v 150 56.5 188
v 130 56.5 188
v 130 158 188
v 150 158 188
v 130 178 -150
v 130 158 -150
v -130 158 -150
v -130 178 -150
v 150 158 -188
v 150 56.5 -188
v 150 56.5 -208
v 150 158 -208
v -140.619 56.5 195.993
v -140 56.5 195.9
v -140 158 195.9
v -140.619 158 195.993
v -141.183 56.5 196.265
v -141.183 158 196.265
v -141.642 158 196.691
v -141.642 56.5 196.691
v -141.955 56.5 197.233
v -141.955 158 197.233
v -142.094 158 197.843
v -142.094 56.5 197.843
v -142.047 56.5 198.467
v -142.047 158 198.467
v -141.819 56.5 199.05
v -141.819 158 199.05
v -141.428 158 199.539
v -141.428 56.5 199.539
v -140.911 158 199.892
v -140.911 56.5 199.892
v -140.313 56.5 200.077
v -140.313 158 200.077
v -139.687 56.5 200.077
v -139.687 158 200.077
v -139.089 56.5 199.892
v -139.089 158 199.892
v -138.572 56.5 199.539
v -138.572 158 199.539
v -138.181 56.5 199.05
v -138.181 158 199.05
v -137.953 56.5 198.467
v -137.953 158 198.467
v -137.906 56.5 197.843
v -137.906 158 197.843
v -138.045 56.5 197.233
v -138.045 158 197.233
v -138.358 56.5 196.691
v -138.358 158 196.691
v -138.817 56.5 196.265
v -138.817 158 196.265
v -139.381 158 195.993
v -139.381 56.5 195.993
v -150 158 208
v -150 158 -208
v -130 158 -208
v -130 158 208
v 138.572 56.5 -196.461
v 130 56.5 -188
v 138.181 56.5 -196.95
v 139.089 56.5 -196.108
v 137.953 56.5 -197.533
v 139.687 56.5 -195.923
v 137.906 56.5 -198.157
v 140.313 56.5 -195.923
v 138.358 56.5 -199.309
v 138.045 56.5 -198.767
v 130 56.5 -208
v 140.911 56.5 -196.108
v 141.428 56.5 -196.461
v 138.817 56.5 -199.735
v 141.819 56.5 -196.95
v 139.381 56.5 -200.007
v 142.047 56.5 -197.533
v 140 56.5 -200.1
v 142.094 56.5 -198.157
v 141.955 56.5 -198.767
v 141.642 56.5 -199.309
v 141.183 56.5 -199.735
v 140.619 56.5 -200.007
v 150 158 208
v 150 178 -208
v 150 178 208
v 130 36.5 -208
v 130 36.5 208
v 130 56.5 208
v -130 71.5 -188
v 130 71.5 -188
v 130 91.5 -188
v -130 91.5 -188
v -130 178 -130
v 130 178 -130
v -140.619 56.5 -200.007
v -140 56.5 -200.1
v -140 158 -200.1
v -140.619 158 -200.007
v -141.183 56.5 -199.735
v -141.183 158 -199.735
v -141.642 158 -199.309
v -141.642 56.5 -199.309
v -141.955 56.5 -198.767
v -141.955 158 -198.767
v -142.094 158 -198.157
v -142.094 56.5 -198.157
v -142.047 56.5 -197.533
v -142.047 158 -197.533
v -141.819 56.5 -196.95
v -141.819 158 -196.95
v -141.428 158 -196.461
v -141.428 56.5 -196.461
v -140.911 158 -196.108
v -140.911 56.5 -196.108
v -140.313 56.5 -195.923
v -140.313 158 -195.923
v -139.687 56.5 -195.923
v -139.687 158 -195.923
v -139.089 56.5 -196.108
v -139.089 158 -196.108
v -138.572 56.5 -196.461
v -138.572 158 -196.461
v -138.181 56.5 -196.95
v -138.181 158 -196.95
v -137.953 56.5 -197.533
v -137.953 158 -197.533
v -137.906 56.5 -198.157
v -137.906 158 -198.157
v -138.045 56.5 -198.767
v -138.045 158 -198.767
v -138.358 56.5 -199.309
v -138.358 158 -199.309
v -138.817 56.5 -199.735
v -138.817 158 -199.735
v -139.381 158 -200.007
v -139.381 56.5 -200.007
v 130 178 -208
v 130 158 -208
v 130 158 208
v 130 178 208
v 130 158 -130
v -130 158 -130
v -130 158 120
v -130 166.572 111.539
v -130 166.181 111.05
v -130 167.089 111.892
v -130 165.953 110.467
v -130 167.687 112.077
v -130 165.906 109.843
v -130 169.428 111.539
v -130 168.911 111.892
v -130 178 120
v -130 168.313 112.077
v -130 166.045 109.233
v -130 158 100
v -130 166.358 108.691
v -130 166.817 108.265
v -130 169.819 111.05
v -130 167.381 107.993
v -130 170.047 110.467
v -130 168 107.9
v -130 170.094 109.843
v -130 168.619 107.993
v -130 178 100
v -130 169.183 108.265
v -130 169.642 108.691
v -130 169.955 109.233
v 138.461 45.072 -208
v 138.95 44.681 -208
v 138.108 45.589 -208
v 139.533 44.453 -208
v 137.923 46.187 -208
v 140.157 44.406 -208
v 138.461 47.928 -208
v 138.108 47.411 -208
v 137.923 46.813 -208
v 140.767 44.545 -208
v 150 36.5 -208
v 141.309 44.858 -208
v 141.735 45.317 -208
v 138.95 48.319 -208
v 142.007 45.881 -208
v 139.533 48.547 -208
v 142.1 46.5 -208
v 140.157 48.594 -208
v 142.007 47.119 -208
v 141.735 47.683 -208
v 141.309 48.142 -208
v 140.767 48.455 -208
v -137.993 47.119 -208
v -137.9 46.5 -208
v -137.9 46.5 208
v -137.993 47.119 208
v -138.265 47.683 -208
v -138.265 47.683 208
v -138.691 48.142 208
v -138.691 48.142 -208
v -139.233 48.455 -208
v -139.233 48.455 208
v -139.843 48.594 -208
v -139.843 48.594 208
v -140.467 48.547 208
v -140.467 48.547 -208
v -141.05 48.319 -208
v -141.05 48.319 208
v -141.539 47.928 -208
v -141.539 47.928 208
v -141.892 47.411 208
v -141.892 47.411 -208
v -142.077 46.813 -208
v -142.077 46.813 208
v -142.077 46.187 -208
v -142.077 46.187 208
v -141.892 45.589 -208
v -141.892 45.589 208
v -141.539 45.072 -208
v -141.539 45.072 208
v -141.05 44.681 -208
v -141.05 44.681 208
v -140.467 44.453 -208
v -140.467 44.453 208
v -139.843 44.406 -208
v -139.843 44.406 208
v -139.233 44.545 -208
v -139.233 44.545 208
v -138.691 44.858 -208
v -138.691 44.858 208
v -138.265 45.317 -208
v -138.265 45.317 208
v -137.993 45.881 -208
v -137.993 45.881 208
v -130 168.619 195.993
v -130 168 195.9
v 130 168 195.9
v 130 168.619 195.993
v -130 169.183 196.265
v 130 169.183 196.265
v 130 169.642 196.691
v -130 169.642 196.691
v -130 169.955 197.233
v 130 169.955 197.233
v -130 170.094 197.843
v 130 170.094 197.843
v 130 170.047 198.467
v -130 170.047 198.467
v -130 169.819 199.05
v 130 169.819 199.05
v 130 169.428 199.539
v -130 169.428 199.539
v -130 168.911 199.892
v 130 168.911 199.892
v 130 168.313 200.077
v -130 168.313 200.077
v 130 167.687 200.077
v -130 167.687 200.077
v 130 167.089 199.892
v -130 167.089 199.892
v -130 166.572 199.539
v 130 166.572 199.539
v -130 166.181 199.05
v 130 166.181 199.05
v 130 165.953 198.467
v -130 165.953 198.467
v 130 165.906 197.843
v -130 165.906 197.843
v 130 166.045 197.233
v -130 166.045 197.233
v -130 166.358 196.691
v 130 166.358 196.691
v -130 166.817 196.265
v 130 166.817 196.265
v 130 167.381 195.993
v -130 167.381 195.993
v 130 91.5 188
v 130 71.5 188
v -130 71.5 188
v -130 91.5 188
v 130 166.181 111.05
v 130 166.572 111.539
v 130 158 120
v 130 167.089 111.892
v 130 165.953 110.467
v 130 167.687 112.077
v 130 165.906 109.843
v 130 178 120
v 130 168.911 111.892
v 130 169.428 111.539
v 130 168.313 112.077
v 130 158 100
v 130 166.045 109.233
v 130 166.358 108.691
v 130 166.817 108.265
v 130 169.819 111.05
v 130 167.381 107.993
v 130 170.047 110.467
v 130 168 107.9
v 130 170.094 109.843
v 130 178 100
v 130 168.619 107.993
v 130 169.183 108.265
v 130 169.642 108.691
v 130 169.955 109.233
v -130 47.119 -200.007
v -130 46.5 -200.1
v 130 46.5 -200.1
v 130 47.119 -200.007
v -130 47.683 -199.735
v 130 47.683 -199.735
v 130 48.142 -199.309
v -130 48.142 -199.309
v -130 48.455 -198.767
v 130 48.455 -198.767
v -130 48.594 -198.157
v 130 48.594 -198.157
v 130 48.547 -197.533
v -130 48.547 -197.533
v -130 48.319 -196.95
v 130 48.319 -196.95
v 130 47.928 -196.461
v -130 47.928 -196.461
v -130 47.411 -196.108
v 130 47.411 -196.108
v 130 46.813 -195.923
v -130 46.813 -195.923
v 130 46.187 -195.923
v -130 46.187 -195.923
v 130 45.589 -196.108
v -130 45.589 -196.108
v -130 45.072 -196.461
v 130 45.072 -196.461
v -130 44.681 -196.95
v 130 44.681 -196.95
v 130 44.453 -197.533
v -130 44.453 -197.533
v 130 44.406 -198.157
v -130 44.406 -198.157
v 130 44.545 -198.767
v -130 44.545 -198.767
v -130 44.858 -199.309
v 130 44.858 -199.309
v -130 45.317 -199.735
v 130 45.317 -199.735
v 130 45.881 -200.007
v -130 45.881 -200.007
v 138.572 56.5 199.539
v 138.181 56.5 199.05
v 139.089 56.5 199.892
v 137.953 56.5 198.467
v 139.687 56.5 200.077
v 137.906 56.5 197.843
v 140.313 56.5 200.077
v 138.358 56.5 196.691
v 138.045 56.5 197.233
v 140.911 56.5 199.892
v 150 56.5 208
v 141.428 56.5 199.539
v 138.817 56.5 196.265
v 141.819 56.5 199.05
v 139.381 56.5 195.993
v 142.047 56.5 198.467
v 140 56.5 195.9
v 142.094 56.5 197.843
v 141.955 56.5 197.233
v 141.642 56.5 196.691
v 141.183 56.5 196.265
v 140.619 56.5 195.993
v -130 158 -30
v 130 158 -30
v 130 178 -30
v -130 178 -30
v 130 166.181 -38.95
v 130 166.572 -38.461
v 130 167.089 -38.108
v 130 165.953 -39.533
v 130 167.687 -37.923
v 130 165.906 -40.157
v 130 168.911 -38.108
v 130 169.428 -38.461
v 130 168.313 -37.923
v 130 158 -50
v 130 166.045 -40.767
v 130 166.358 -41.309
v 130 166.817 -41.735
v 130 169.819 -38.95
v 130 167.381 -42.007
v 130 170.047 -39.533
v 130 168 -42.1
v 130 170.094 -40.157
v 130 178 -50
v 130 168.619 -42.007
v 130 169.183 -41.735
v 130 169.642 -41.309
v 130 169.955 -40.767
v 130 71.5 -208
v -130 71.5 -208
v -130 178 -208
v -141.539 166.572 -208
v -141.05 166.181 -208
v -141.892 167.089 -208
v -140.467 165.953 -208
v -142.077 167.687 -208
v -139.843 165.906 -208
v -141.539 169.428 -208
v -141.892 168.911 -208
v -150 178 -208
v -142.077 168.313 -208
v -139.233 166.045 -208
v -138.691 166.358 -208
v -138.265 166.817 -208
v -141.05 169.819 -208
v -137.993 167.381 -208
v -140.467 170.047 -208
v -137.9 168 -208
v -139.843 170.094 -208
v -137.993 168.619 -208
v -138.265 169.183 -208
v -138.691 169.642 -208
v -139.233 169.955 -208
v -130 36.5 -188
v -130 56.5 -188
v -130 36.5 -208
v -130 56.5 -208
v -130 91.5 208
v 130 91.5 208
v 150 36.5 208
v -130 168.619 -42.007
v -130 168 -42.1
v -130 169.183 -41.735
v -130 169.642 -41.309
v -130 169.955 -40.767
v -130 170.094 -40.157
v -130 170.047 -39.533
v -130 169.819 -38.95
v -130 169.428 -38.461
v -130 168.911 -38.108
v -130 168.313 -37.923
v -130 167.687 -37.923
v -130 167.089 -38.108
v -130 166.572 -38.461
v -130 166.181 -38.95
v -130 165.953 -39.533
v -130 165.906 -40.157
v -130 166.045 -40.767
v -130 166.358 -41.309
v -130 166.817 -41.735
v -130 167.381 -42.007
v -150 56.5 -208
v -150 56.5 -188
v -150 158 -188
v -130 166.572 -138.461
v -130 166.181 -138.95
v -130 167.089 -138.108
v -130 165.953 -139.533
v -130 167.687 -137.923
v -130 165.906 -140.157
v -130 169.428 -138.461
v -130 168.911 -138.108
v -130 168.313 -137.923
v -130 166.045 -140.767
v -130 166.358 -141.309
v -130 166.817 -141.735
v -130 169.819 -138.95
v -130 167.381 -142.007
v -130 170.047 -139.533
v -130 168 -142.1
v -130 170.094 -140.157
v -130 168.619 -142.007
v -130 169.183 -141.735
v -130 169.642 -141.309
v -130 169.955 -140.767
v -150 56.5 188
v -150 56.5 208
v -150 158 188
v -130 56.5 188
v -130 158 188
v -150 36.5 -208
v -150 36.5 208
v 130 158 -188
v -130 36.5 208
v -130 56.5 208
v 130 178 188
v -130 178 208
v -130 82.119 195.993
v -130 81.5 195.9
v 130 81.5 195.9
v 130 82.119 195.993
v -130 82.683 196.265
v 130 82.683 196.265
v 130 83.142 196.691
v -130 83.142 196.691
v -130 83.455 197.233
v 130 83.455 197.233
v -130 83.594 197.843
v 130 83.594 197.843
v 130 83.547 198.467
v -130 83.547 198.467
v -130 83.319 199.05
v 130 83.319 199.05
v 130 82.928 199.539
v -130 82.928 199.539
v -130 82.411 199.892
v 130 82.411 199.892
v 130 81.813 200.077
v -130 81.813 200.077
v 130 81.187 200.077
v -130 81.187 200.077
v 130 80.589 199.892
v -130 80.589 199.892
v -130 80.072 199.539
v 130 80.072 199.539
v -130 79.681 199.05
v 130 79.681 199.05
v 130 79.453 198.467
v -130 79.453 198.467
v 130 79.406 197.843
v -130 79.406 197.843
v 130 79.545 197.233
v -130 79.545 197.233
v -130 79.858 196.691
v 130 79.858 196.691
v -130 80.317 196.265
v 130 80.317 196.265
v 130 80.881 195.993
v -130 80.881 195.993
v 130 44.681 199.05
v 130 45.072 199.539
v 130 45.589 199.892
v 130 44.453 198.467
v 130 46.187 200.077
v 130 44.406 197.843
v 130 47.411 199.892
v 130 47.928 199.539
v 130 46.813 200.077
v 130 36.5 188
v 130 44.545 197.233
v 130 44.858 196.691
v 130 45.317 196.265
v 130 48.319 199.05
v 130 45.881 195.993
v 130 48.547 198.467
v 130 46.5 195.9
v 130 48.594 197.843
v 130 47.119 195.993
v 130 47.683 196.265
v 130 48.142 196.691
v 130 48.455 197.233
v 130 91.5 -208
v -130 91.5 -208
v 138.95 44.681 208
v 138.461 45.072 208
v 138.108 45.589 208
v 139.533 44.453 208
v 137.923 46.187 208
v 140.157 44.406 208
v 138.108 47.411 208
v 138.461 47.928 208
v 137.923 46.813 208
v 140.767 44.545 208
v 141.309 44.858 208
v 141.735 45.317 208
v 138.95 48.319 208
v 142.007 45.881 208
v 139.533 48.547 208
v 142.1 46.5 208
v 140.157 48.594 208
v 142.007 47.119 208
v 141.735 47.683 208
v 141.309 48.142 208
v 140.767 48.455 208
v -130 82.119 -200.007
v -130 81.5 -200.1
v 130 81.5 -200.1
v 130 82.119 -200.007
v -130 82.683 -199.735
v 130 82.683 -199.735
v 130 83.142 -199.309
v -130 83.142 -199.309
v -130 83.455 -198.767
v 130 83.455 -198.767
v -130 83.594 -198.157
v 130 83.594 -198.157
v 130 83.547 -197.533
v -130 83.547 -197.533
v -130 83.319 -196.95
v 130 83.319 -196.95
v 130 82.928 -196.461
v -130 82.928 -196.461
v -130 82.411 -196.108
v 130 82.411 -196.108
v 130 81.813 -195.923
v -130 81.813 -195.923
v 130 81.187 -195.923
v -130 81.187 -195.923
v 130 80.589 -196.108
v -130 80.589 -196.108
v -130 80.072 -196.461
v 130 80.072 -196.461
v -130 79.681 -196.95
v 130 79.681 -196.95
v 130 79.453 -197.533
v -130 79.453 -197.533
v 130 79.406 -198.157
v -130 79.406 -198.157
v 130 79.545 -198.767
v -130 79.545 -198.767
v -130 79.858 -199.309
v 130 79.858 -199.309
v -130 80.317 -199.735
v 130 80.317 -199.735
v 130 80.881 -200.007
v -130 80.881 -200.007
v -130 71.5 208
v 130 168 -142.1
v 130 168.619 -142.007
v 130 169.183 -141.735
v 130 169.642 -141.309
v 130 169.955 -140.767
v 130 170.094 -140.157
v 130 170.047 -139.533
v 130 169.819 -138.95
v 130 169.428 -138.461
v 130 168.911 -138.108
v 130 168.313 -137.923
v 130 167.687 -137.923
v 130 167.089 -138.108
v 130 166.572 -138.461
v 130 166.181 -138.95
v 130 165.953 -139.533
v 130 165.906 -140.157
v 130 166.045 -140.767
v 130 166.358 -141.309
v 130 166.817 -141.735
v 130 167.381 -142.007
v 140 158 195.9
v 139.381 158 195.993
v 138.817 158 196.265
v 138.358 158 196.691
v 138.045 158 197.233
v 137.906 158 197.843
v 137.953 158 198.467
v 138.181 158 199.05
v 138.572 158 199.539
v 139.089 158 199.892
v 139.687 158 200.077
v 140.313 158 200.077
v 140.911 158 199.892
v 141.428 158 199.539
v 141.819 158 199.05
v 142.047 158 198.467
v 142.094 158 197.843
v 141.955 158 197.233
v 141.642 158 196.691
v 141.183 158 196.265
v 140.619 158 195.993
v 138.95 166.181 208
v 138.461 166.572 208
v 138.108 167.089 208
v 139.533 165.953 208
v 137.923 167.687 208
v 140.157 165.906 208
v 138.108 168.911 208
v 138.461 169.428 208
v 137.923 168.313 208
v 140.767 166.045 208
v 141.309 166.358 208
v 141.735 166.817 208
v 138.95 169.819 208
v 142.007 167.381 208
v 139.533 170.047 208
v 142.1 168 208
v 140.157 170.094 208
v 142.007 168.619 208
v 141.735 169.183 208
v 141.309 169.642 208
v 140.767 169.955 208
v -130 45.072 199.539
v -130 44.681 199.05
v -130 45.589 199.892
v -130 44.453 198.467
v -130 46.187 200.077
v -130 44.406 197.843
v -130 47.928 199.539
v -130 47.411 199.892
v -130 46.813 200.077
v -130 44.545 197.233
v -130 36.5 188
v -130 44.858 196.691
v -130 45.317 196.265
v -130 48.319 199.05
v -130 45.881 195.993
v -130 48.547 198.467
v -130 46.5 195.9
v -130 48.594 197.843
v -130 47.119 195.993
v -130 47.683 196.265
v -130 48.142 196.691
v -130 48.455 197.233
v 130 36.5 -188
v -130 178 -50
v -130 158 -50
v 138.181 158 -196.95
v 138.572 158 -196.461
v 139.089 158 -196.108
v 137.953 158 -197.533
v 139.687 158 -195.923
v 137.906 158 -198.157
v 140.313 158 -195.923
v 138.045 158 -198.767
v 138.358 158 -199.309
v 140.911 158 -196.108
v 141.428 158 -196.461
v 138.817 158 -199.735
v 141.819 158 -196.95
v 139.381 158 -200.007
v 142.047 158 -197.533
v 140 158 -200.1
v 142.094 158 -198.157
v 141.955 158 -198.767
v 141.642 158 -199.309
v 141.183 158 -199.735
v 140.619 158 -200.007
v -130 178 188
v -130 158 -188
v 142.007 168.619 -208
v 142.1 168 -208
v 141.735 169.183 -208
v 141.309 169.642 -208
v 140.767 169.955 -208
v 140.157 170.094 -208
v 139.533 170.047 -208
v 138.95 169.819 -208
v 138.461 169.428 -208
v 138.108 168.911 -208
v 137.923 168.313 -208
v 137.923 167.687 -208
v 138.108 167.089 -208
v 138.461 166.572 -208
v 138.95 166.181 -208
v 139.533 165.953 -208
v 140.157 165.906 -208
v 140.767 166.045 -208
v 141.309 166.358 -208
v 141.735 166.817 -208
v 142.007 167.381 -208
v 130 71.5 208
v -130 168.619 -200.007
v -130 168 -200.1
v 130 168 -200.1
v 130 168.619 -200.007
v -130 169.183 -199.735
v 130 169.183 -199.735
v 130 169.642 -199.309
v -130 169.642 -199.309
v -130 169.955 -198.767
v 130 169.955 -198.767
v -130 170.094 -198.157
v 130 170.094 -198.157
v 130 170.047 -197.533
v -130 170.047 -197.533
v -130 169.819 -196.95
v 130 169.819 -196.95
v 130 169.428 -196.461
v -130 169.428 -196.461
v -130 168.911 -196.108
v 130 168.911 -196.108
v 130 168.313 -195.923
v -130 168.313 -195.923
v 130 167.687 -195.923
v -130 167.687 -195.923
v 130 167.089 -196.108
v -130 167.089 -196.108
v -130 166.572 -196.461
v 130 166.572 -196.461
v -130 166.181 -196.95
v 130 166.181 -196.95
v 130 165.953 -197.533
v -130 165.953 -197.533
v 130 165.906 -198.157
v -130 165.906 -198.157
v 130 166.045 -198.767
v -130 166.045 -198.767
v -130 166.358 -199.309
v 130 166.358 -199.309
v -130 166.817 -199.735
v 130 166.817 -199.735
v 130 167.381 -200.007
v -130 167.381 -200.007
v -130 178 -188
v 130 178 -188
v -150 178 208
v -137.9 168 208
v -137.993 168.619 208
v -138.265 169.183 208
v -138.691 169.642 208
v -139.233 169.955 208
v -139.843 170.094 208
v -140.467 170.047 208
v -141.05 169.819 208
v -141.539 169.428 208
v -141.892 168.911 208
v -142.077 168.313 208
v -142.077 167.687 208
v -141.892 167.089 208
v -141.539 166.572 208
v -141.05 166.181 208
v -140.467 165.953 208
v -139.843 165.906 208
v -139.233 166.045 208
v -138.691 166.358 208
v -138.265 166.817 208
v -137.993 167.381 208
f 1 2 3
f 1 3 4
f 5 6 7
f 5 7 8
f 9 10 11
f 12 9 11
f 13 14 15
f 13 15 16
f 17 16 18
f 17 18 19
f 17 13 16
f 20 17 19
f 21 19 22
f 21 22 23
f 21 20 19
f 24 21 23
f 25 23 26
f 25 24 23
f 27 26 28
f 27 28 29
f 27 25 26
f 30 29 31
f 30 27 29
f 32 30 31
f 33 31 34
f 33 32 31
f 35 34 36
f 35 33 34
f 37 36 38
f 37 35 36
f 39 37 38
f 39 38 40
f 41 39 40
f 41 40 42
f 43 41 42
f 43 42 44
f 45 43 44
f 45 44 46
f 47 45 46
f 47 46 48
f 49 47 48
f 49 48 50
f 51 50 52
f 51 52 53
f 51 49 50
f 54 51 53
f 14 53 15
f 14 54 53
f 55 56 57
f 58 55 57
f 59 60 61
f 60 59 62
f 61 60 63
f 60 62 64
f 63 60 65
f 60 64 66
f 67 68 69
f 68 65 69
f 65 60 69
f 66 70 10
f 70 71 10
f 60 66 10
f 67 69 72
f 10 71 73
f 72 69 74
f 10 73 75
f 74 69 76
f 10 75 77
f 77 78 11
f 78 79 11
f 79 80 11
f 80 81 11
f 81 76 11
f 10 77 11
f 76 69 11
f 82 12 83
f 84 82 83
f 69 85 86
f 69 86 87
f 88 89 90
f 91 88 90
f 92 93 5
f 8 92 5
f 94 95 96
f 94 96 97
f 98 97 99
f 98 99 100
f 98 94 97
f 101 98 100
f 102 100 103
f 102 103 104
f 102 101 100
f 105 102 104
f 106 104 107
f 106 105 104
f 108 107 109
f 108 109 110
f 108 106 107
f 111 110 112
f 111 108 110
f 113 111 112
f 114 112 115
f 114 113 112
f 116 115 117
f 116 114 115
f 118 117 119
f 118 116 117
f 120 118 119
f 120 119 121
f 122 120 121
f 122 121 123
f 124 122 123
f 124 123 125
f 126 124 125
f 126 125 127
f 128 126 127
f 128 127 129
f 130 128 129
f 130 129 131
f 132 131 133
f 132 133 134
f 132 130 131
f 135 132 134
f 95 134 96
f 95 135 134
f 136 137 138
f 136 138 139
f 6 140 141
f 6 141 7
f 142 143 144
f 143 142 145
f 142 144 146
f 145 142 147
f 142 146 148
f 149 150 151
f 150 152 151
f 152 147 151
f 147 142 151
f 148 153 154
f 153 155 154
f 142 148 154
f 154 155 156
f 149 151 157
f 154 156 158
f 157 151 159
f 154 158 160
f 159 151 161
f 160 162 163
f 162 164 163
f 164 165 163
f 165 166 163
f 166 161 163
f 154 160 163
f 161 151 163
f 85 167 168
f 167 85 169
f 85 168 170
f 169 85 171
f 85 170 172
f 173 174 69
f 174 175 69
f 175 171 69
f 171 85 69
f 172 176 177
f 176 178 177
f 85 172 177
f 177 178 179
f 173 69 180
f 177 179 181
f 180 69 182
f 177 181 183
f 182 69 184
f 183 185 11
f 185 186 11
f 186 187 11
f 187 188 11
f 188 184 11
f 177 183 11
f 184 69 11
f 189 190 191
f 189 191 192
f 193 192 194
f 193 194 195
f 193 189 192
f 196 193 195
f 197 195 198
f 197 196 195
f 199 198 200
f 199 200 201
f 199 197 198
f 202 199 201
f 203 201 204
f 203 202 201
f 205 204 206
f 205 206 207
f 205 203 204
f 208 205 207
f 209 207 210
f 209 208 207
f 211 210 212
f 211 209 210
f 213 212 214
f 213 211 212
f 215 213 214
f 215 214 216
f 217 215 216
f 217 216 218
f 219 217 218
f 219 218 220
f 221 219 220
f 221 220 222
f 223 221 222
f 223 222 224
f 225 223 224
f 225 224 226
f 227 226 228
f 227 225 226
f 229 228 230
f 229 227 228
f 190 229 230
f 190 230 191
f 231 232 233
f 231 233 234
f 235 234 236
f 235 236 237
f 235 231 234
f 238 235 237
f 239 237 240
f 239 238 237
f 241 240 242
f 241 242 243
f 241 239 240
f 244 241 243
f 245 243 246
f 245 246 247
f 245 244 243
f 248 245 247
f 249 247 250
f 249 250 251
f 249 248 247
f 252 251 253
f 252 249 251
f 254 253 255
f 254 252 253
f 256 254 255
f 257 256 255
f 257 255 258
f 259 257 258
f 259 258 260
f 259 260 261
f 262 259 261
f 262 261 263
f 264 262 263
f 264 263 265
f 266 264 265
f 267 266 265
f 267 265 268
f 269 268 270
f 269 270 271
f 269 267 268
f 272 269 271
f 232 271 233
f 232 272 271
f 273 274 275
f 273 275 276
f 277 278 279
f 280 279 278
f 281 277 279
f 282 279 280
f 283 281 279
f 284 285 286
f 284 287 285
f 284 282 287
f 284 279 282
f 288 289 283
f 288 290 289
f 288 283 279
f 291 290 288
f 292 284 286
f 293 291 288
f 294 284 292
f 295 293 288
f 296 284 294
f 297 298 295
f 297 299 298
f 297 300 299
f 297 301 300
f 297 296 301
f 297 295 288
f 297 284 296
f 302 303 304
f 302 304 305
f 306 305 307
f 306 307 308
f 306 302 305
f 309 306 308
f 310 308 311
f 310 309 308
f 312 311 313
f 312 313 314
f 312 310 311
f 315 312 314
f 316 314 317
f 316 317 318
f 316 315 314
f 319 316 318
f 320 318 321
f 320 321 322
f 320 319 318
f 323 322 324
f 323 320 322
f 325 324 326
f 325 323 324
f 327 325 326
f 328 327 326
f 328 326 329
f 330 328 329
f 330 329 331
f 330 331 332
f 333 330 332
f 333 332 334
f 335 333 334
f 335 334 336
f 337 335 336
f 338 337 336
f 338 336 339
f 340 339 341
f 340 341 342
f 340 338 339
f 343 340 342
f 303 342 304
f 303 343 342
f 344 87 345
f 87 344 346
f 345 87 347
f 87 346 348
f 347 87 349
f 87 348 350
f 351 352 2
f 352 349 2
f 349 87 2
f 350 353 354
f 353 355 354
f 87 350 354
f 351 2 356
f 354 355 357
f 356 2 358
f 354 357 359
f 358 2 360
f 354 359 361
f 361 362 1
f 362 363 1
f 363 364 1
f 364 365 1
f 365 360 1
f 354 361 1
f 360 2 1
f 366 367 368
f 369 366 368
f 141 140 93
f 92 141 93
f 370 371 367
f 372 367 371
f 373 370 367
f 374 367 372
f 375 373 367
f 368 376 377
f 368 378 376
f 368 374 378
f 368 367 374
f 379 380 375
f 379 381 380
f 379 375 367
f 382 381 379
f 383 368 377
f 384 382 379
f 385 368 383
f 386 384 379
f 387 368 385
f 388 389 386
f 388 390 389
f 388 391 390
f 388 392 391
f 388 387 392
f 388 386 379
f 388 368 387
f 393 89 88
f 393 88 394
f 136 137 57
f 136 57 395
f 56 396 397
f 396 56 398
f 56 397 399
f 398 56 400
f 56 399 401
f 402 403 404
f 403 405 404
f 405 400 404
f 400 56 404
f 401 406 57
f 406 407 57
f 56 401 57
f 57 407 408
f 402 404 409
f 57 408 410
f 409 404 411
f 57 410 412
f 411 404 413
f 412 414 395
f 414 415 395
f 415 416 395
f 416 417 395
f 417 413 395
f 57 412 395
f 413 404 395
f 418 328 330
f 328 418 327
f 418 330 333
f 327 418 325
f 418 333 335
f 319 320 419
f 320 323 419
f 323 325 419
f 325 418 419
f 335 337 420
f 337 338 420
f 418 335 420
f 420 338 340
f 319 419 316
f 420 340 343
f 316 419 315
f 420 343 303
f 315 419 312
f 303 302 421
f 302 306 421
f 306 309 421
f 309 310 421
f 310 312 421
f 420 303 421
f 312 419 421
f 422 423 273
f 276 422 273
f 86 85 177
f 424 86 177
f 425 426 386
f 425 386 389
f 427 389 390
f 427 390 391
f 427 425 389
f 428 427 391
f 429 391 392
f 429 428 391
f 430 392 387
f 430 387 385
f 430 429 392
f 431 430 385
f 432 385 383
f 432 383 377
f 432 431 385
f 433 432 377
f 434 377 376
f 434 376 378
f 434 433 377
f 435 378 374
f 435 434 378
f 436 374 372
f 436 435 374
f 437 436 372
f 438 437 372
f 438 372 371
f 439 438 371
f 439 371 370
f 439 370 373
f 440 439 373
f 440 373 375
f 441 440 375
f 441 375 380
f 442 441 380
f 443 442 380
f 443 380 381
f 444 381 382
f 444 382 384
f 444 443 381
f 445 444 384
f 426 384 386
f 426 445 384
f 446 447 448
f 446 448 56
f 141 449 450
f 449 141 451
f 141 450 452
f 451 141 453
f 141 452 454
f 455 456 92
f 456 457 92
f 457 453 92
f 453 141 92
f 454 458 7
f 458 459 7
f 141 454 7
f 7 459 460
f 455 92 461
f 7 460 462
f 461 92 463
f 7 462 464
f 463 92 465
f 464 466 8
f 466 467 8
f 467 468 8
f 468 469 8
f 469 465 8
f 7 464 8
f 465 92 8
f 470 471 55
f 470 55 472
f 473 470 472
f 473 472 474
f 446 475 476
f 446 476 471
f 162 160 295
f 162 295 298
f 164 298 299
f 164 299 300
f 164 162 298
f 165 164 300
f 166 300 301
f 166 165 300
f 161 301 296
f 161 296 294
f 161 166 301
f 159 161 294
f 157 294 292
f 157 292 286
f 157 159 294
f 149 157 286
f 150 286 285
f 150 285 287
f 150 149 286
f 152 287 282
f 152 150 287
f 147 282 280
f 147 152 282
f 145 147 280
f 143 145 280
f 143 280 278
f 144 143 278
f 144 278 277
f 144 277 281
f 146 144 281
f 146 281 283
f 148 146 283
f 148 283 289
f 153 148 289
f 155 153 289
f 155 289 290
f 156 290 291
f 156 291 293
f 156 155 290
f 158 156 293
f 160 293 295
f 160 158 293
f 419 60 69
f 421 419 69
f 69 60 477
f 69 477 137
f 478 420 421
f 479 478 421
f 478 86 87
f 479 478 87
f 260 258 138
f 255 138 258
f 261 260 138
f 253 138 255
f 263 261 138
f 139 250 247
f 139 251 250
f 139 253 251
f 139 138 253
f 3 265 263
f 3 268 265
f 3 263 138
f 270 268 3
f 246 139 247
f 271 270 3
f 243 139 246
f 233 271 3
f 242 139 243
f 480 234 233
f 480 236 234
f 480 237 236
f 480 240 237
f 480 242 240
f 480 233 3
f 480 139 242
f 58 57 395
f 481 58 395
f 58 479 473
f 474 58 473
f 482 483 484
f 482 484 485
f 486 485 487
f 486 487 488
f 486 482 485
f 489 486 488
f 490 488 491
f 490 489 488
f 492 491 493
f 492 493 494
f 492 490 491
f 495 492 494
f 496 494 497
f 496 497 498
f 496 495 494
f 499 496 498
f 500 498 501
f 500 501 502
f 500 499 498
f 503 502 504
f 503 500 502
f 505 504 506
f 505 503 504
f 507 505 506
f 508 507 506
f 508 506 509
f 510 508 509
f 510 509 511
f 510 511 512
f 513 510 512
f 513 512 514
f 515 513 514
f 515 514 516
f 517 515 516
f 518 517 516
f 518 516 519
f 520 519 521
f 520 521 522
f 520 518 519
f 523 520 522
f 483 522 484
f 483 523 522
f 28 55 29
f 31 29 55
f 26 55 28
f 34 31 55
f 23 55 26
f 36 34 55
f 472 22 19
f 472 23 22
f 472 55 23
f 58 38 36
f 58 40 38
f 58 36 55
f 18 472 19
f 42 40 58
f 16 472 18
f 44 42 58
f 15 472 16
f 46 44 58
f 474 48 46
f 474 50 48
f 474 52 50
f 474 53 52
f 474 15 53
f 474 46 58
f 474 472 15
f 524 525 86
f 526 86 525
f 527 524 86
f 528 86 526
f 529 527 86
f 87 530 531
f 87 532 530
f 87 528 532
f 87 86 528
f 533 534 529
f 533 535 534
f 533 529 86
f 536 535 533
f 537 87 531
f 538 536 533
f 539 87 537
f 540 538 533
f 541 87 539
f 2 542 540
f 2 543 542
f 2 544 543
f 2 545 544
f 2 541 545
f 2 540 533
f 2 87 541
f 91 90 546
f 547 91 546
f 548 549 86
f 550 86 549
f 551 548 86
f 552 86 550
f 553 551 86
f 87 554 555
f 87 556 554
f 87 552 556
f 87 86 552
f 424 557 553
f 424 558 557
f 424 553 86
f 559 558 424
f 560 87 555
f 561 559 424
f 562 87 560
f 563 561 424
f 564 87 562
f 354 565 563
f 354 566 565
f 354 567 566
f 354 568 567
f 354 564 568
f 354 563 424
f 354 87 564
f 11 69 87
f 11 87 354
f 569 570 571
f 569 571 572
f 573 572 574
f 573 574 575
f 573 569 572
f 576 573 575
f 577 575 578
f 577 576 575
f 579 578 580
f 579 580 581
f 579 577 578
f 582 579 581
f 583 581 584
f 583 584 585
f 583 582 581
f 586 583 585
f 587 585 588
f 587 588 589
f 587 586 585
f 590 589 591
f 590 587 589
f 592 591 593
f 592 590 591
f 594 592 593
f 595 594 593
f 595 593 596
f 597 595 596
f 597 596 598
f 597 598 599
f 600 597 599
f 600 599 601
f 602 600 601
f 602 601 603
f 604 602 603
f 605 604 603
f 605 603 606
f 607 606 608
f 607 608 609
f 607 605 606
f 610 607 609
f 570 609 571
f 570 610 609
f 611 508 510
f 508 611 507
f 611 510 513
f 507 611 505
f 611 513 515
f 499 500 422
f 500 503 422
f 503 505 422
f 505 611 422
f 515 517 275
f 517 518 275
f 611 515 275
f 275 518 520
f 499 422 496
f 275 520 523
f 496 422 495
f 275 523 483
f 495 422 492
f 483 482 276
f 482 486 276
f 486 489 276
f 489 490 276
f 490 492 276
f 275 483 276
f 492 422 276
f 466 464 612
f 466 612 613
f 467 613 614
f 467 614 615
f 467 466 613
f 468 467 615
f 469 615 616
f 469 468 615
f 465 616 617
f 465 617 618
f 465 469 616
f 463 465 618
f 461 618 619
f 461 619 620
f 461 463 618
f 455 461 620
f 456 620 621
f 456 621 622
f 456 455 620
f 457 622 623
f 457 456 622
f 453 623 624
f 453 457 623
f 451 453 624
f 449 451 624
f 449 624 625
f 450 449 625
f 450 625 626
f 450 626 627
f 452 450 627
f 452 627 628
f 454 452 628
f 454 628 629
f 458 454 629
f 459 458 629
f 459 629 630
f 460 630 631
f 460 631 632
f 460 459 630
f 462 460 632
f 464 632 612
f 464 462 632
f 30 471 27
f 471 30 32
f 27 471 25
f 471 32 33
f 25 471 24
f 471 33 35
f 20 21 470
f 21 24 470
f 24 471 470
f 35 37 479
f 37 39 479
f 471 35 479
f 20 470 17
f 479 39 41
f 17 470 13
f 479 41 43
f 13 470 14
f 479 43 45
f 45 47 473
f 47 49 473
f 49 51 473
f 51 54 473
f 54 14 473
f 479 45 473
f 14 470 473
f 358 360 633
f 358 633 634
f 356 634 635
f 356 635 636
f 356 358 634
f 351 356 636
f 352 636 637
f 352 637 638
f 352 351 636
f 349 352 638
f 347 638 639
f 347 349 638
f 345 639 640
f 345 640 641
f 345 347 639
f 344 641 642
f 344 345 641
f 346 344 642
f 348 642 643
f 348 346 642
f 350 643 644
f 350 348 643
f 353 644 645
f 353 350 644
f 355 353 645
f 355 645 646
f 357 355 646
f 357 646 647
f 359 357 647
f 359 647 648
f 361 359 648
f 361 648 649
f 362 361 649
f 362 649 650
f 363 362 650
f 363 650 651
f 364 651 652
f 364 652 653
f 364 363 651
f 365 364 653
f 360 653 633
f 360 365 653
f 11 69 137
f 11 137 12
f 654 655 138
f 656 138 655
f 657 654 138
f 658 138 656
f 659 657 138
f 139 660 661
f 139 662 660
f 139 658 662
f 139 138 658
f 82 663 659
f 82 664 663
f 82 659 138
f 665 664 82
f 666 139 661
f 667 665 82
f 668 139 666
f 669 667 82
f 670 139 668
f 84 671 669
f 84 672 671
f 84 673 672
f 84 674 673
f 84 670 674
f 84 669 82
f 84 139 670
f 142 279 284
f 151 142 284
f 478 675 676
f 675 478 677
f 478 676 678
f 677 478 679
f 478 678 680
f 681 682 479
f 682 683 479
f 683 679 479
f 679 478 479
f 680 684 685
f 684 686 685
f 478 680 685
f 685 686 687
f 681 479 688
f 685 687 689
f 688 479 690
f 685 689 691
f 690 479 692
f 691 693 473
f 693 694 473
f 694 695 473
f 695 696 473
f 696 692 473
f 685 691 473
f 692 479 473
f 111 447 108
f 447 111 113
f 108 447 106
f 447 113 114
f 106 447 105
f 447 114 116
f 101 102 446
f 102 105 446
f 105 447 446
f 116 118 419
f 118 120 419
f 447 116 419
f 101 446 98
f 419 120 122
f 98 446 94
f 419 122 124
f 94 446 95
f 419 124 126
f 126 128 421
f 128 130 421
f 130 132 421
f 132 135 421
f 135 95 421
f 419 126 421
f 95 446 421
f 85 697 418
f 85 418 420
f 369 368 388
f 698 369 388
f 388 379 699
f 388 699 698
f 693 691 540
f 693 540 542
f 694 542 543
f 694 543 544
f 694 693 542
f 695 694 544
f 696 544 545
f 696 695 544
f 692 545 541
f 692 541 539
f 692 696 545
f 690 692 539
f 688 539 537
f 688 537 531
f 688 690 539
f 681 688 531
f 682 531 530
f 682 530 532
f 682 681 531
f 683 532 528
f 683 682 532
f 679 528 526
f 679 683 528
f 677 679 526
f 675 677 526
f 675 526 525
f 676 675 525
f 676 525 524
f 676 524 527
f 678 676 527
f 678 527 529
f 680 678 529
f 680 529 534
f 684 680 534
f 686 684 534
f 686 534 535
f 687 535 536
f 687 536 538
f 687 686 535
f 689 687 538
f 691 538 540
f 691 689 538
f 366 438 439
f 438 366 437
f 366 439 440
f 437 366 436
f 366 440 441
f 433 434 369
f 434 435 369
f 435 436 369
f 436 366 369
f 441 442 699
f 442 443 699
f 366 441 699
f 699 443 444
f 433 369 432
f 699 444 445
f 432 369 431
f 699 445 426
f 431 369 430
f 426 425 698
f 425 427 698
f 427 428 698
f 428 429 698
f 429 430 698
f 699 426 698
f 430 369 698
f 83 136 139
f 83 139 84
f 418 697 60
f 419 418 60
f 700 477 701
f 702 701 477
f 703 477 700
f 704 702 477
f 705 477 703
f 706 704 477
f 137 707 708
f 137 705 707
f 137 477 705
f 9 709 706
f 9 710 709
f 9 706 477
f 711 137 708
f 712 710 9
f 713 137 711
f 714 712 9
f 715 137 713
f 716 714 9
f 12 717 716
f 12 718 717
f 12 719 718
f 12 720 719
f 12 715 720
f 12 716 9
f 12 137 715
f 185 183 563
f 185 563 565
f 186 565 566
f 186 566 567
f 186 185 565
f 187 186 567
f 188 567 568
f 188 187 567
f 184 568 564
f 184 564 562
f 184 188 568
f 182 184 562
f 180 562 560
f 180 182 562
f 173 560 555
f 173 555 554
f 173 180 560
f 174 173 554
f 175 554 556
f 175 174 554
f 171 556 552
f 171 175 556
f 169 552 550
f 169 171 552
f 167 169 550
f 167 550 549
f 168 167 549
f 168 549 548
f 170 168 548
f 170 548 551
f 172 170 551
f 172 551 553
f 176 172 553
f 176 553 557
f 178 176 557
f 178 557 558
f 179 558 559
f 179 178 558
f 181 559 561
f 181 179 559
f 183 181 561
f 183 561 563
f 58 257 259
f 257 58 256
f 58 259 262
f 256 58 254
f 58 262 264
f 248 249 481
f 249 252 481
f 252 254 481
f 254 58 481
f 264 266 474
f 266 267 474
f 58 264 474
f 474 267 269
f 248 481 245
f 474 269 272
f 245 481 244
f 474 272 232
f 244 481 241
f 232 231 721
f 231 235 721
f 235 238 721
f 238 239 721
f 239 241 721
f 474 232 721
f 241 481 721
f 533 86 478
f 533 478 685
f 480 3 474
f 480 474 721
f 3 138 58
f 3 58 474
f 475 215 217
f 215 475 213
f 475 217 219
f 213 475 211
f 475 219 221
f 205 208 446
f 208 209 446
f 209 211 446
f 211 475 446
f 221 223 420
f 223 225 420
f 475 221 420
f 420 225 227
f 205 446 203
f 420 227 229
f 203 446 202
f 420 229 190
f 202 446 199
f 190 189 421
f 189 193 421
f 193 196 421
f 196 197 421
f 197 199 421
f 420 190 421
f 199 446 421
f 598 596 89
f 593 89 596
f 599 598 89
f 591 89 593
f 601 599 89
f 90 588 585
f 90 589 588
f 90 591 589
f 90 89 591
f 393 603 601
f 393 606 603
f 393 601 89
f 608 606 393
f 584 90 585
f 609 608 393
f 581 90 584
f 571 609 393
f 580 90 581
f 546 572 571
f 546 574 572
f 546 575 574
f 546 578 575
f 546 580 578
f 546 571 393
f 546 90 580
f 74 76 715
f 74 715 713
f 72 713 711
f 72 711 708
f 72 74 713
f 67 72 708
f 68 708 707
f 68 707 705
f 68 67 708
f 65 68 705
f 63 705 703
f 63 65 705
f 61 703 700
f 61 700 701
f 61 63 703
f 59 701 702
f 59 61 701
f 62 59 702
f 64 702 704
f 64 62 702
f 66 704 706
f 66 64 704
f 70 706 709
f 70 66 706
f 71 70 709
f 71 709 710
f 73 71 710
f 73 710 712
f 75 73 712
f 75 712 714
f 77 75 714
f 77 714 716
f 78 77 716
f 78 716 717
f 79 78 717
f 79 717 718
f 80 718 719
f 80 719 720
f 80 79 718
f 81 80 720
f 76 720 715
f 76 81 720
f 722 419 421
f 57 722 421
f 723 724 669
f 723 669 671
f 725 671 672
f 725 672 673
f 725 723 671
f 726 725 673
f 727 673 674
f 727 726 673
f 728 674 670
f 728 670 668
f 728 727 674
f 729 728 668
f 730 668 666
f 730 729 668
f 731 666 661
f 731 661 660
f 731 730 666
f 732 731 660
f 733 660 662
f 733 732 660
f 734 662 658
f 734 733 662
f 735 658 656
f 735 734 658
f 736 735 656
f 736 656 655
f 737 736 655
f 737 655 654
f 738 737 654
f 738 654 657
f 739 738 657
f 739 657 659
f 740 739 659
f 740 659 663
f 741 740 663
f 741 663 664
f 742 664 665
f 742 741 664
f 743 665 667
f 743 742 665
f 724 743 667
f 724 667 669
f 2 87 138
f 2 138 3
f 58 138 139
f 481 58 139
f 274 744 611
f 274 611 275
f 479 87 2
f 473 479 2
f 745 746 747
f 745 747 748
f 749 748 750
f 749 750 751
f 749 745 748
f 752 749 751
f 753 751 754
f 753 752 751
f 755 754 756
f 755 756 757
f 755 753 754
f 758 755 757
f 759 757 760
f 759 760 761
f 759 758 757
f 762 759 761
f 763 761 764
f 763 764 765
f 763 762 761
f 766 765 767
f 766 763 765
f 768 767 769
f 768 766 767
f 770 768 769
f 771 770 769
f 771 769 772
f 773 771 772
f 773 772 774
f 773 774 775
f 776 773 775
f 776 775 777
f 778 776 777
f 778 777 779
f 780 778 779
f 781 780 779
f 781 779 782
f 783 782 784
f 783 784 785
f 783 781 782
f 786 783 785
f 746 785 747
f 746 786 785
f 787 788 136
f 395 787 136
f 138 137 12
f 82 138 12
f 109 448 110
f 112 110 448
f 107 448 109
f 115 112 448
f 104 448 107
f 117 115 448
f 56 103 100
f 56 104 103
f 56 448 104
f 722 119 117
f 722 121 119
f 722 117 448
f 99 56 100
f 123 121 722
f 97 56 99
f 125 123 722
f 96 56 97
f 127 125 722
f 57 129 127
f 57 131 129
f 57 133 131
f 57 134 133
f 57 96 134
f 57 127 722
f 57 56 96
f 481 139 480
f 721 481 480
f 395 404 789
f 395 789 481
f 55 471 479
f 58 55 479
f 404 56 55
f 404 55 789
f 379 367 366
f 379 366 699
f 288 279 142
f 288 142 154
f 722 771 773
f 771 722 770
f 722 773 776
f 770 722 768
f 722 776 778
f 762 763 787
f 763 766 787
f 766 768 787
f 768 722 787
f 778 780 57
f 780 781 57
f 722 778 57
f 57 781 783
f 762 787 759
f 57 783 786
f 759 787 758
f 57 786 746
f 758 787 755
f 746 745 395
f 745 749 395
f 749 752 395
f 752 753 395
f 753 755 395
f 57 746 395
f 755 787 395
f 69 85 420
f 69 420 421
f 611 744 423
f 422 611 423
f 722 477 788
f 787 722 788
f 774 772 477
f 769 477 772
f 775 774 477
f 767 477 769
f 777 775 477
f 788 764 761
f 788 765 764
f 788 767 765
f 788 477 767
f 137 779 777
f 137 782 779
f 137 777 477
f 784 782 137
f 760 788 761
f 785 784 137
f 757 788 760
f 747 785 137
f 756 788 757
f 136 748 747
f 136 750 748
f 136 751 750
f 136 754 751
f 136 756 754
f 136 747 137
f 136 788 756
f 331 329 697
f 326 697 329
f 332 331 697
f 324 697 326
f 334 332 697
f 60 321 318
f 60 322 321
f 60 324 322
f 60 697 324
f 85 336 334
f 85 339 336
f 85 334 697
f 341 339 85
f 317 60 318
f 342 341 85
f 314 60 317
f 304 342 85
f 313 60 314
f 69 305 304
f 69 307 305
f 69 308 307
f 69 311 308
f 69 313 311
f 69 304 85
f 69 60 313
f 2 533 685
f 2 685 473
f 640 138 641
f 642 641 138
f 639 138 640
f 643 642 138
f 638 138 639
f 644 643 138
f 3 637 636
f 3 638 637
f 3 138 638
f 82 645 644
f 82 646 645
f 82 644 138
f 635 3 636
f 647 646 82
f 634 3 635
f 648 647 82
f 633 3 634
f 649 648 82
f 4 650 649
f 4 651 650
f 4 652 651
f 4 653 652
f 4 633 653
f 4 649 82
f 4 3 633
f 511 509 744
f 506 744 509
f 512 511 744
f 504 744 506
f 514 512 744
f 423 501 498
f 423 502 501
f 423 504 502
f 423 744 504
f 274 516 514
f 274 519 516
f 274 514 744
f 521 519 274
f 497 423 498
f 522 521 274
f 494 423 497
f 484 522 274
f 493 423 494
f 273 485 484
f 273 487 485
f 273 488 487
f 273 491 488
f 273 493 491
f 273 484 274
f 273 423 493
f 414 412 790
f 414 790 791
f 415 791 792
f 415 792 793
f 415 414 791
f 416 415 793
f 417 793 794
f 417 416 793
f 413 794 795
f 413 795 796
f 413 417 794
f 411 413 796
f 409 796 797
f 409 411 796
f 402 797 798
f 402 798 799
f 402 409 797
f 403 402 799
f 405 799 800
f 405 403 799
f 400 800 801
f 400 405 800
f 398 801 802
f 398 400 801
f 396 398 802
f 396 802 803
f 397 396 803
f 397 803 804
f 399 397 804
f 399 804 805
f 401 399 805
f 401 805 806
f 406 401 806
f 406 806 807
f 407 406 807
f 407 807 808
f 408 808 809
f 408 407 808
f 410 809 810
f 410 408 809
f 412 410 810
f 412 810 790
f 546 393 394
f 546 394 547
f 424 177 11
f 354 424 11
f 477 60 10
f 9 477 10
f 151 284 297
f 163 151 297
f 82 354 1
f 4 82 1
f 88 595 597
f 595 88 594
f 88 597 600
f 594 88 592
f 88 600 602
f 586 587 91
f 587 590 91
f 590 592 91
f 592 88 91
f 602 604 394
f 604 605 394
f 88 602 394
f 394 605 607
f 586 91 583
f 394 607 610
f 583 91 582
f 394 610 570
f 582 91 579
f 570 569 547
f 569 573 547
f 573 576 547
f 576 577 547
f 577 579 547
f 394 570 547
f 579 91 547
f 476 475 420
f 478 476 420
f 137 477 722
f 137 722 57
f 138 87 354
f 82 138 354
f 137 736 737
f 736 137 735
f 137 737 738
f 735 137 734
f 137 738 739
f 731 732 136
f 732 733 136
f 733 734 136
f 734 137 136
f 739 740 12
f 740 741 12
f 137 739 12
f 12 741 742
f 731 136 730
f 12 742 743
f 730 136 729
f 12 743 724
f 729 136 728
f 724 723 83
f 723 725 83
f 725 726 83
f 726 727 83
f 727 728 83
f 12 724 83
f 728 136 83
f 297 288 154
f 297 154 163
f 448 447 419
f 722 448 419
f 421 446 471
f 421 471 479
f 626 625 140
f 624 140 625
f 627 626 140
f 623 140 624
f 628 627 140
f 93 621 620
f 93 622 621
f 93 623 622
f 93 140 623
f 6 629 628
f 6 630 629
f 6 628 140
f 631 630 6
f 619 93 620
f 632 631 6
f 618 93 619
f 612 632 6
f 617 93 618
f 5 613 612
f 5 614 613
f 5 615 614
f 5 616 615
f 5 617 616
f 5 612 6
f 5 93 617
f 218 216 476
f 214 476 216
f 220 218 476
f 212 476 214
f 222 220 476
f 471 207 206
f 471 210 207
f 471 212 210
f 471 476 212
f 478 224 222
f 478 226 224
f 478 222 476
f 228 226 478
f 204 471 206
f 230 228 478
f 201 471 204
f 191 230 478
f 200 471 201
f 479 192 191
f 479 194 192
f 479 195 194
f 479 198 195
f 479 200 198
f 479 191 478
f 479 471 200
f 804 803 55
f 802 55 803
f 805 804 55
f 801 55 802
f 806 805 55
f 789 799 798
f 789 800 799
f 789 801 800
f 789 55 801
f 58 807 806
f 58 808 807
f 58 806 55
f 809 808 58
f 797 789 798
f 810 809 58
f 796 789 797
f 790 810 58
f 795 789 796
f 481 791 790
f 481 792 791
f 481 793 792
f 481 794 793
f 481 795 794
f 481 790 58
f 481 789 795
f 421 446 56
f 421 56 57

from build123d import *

# Parameters (mm, degrees)
SK_BOTSIDERAILS_W       = 20
SK_BOTSIDERAILS_H       = 20
SK_BOTSIDERAILS_R       = 2.1
EX_BOTSIDERAILS_DEPTH   = 416
EX_BOTSIDERAILS_2_DEPTH = 416
SK_TOPSIDERAILS_W       = 20
SK_TOPSIDERAILS_H       = 20
SK_TOPSIDERAILS_R       = 2.1
EX_TOPSIDERAILS_DEPTH   = 416
EX_TOPSIDERAILS_2_DEPTH = 416
SK_BOTENDRAILS_W        = 20
SK_BOTENDRAILS_H        = 20
SK_BOTENDRAILS_R        = 2.1
EX_BOTENDRAILS_DEPTH    = 260
EX_BOTENDRAILS_2_DEPTH  = 260
SK_TOPENDRAILS_W        = 20
SK_TOPENDRAILS_H        = 20
SK_TOPENDRAILS_R        = 2.1
EX_TOPENDRAILS_DEPTH    = 260
EX_TOPENDRAILS_2_DEPTH  = 260
SK_MIDCROSS_W           = 20
SK_MIDCROSS_H           = 20
SK_MIDCROSS_R           = 2.1
EX_MIDCROSS_DEPTH       = 260
EX_MIDCROSS_2_DEPTH     = 260
SK_TOPCROSS_W           = 20
SK_TOPCROSS_H           = 20
SK_TOPCROSS_R           = 2.1
EX_TOPCROSS_DEPTH       = 260
EX_TOPCROSS_2_DEPTH     = 260
EX_TOPCROSS_3_DEPTH     = 260
SK_UPRIGHTS_W           = 20
SK_UPRIGHTS_H           = 20
SK_UPRIGHTS_R           = 2.1
EX_UPRIGHTS_DEPTH       = 101.5
EX_UPRIGHTS_2_DEPTH     = 101.5
EX_UPRIGHTS_3_DEPTH     = 101.5
EX_UPRIGHTS_4_DEPTH     = 101.5


with BuildPart() as part:
    # SK_BotSideRails → EX_BotSideRails (new body)
    with BuildSketch(Plane.XY.offset(-208)):
        with Locations((140, 46.5)):
            Rectangle(SK_BOTSIDERAILS_W, SK_BOTSIDERAILS_H)
        with Locations((140, 46.5)):
            Circle(SK_BOTSIDERAILS_R, mode=Mode.SUBTRACT)
    extrude(amount=EX_BOTSIDERAILS_DEPTH)


with BuildPart() as body_2:
    # SK_BotSideRails → EX_BotSideRails 2 (new body)
    with BuildSketch(Plane.XY.offset(-208)):
        with Locations((-140, 46.5)):
            Rectangle(SK_BOTSIDERAILS_W, SK_BOTSIDERAILS_H)
        with Locations((-140, 46.5)):
            Circle(SK_BOTSIDERAILS_R, mode=Mode.SUBTRACT)
    extrude(amount=EX_BOTSIDERAILS_2_DEPTH)


with BuildPart() as body_3:
    # SK_TopSideRails → EX_TopSideRails (new body)
    with BuildSketch(Plane.XY.offset(-208)):
        with Locations((140, 168)):
            Rectangle(SK_TOPSIDERAILS_W, SK_TOPSIDERAILS_H)
        with Locations((140, 168)):
            Circle(SK_TOPSIDERAILS_R, mode=Mode.SUBTRACT)
    extrude(amount=EX_TOPSIDERAILS_DEPTH)


with BuildPart() as body_4:
    # SK_TopSideRails → EX_TopSideRails 2 (new body)
    with BuildSketch(Plane.XY.offset(-208)):
        with Locations((-140, 168)):
            Rectangle(SK_TOPSIDERAILS_W, SK_TOPSIDERAILS_H)
        with Locations((-140, 168)):
            Circle(SK_TOPSIDERAILS_R, mode=Mode.SUBTRACT)
    extrude(amount=EX_TOPSIDERAILS_2_DEPTH)


with BuildPart() as body_5:
    # SK_BotEndRails → EX_BotEndRails (new body)
    with BuildSketch(Plane(origin=(-130, 0, 0), x_dir=(0, 0, -1), z_dir=(1, 0, 0))):
        with Locations((-198, 46.5)):
            Rectangle(SK_BOTENDRAILS_W, SK_BOTENDRAILS_H)
        with Locations((-198, 46.5)):
            Circle(SK_BOTENDRAILS_R, mode=Mode.SUBTRACT)
    extrude(amount=EX_BOTENDRAILS_DEPTH)


with BuildPart() as body_6:
    # SK_BotEndRails → EX_BotEndRails 2 (new body)
    with BuildSketch(Plane(origin=(-130, 0, 0), x_dir=(0, 0, -1), z_dir=(1, 0, 0))):
        with Locations((198, 46.5)):
            Rectangle(SK_BOTENDRAILS_W, SK_BOTENDRAILS_H)
        with Locations((198, 46.5)):
            Circle(SK_BOTENDRAILS_R, mode=Mode.SUBTRACT)
    extrude(amount=EX_BOTENDRAILS_2_DEPTH)


with BuildPart() as body_7:
    # SK_TopEndRails → EX_TopEndRails (new body)
    with BuildSketch(Plane(origin=(-130, 0, 0), x_dir=(0, 0, -1), z_dir=(1, 0, 0))):
        with Locations((-198, 168)):
            Rectangle(SK_TOPENDRAILS_W, SK_TOPENDRAILS_H)
        with Locations((-198, 168)):
            Circle(SK_TOPENDRAILS_R, mode=Mode.SUBTRACT)
    extrude(amount=EX_TOPENDRAILS_DEPTH)


with BuildPart() as body_8:
    # SK_TopEndRails → EX_TopEndRails 2 (new body)
    with BuildSketch(Plane(origin=(-130, 0, 0), x_dir=(0, 0, -1), z_dir=(1, 0, 0))):
        with Locations((198, 168)):
            Rectangle(SK_TOPENDRAILS_W, SK_TOPENDRAILS_H)
        with Locations((198, 168)):
            Circle(SK_TOPENDRAILS_R, mode=Mode.SUBTRACT)
    extrude(amount=EX_TOPENDRAILS_2_DEPTH)


with BuildPart() as body_9:
    # SK_MidCross → EX_MidCross (new body)
    with BuildSketch(Plane(origin=(-130, 0, 0), x_dir=(0, 0, -1), z_dir=(1, 0, 0))):
        with Locations((-198, 81.5)):
            Rectangle(SK_MIDCROSS_W, SK_MIDCROSS_H)
        with Locations((-198, 81.5)):
            Circle(SK_MIDCROSS_R, mode=Mode.SUBTRACT)
    extrude(amount=EX_MIDCROSS_DEPTH)


with BuildPart() as body_10:
    # SK_MidCross → EX_MidCross 2 (new body)
    with BuildSketch(Plane(origin=(-130, 0, 0), x_dir=(0, 0, -1), z_dir=(1, 0, 0))):
        with Locations((198, 81.5)):
            Rectangle(SK_MIDCROSS_W, SK_MIDCROSS_H)
        with Locations((198, 81.5)):
            Circle(SK_MIDCROSS_R, mode=Mode.SUBTRACT)
    extrude(amount=EX_MIDCROSS_2_DEPTH)


with BuildPart() as body_11:
    # SK_TopCross → EX_TopCross (new body)
    with BuildSketch(Plane(origin=(-130, 0, 0), x_dir=(0, 0, -1), z_dir=(1, 0, 0))):
        with Locations((40, 168)):
            Rectangle(SK_TOPCROSS_W, SK_TOPCROSS_H)
        with Locations((40, 168)):
            Circle(SK_TOPCROSS_R, mode=Mode.SUBTRACT)
    extrude(amount=EX_TOPCROSS_DEPTH)


with BuildPart() as body_12:
    # SK_TopCross → EX_TopCross 2 (new body)
    with BuildSketch(Plane(origin=(-130, 0, 0), x_dir=(0, 0, -1), z_dir=(1, 0, 0))):
        with Locations((140, 168)):
            Rectangle(SK_TOPCROSS_W, SK_TOPCROSS_H)
        with Locations((140, 168)):
            Circle(SK_TOPCROSS_R, mode=Mode.SUBTRACT)
    extrude(amount=EX_TOPCROSS_2_DEPTH)


with BuildPart() as body_13:
    # SK_TopCross → EX_TopCross 3 (new body)
    with BuildSketch(Plane(origin=(-130, 0, 0), x_dir=(0, 0, -1), z_dir=(1, 0, 0))):
        with Locations((-110, 168)):
            Rectangle(SK_TOPCROSS_W, SK_TOPCROSS_H)
        with Locations((-110, 168)):
            Circle(SK_TOPCROSS_R, mode=Mode.SUBTRACT)
    extrude(amount=EX_TOPCROSS_3_DEPTH)


with BuildPart() as body_14:
    # SK_Uprights → EX_Uprights (new body)
    with BuildSketch(Plane(origin=(0, 56.5, 0), x_dir=(1, 0, 0), z_dir=(0, 1, 0))):
        with Locations((140, -198)):
            Rectangle(SK_UPRIGHTS_W, SK_UPRIGHTS_H)
        with Locations((140, -198)):
            Circle(SK_UPRIGHTS_R, mode=Mode.SUBTRACT)
    extrude(amount=EX_UPRIGHTS_DEPTH)


with BuildPart() as body_15:
    # SK_Uprights → EX_Uprights 2 (new body)
    with BuildSketch(Plane(origin=(0, 56.5, 0), x_dir=(1, 0, 0), z_dir=(0, 1, 0))):
        with Locations((-140, -198)):
            Rectangle(SK_UPRIGHTS_W, SK_UPRIGHTS_H)
        with Locations((-140, -198)):
            Circle(SK_UPRIGHTS_R, mode=Mode.SUBTRACT)
    extrude(amount=EX_UPRIGHTS_2_DEPTH)


with BuildPart() as body_16:
    # SK_Uprights → EX_Uprights 3 (new body)
    with BuildSketch(Plane(origin=(0, 56.5, 0), x_dir=(1, 0, 0), z_dir=(0, 1, 0))):
        with Locations((140, 198)):
            Rectangle(SK_UPRIGHTS_W, SK_UPRIGHTS_H)
        with Locations((140, 198)):
            Circle(SK_UPRIGHTS_R, mode=Mode.SUBTRACT)
    extrude(amount=EX_UPRIGHTS_3_DEPTH)


with BuildPart() as body_17:
    # SK_Uprights → EX_Uprights 4 (new body)
    with BuildSketch(Plane(origin=(0, 56.5, 0), x_dir=(1, 0, 0), z_dir=(0, 1, 0))):
        with Locations((-140, 198)):
            Rectangle(SK_UPRIGHTS_W, SK_UPRIGHTS_H)
        with Locations((-140, 198)):
            Circle(SK_UPRIGHTS_R, mode=Mode.SUBTRACT)
    extrude(amount=EX_UPRIGHTS_4_DEPTH)


solid = Compound([part.part, body_2.part, body_3.part, body_4.part, body_5.part, body_6.part, body_7.part, body_8.part, body_9.part, body_10.part, body_11.part, body_12.part, body_13.part, body_14.part, body_15.part, body_16.part, body_17.part])
